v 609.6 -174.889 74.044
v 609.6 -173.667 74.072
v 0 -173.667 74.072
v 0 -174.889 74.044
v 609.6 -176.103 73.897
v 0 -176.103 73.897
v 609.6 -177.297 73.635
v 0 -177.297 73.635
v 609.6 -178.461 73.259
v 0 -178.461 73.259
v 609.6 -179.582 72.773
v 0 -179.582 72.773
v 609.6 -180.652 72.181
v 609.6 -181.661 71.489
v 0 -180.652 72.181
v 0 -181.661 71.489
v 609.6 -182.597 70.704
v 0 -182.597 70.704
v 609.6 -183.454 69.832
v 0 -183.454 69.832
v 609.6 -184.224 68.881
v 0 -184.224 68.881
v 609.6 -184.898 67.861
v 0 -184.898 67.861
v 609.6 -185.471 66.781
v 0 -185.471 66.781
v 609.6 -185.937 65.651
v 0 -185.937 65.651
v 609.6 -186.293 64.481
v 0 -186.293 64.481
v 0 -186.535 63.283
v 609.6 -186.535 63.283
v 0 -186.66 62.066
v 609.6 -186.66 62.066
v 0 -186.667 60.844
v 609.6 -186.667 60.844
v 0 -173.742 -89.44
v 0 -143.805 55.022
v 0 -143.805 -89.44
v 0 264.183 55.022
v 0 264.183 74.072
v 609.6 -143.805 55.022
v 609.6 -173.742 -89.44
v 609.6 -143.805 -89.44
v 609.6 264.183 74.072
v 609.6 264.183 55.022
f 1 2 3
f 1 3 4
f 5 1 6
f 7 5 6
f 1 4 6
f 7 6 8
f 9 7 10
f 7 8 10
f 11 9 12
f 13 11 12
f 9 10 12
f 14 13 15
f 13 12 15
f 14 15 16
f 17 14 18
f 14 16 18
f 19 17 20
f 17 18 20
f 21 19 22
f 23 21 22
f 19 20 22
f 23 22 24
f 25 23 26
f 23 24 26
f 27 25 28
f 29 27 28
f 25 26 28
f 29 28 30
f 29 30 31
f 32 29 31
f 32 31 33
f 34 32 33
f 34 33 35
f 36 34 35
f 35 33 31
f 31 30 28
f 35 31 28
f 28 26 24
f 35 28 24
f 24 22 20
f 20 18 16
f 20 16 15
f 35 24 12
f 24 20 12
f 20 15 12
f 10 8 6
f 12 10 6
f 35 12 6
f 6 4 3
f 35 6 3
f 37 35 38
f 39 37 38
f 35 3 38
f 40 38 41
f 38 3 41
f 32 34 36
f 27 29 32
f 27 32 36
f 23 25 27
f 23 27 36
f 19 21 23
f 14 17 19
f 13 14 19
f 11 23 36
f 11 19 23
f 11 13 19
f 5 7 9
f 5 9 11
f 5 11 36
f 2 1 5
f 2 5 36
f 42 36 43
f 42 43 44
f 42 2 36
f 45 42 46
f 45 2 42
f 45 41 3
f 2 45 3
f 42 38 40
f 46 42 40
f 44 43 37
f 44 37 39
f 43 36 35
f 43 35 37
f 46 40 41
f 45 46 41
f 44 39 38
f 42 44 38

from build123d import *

# Parameters (mm, degrees)
F1_DEPTH = 609.6


with BuildPart() as f1:
    # F0 (on Right) → F1 (new body)
    with BuildSketch(Plane.YZ):
        with BuildLine():
            Line((-143.804814, -89.440058), (-143.804814, 55.022442))
            Line((-143.804814, 55.022442), (264.182686, 55.022442))
            Line((264.182686, 55.022442), (264.182686, 74.072442))
            Line((264.182686, 74.072442), (-173.666681, 74.072442))
            ThreePointArc((-173.666681, 74.072442), (-183.036482, 70.278105), (-186.667314, 60.843743))
            Line((-186.667314, 60.843743), (-173.74242, -89.440058))
            Line((-173.74242, -89.440058), (-143.804814, -89.440058))
        make_face()
    extrude(amount=F1_DEPTH)


solid = f1.part
